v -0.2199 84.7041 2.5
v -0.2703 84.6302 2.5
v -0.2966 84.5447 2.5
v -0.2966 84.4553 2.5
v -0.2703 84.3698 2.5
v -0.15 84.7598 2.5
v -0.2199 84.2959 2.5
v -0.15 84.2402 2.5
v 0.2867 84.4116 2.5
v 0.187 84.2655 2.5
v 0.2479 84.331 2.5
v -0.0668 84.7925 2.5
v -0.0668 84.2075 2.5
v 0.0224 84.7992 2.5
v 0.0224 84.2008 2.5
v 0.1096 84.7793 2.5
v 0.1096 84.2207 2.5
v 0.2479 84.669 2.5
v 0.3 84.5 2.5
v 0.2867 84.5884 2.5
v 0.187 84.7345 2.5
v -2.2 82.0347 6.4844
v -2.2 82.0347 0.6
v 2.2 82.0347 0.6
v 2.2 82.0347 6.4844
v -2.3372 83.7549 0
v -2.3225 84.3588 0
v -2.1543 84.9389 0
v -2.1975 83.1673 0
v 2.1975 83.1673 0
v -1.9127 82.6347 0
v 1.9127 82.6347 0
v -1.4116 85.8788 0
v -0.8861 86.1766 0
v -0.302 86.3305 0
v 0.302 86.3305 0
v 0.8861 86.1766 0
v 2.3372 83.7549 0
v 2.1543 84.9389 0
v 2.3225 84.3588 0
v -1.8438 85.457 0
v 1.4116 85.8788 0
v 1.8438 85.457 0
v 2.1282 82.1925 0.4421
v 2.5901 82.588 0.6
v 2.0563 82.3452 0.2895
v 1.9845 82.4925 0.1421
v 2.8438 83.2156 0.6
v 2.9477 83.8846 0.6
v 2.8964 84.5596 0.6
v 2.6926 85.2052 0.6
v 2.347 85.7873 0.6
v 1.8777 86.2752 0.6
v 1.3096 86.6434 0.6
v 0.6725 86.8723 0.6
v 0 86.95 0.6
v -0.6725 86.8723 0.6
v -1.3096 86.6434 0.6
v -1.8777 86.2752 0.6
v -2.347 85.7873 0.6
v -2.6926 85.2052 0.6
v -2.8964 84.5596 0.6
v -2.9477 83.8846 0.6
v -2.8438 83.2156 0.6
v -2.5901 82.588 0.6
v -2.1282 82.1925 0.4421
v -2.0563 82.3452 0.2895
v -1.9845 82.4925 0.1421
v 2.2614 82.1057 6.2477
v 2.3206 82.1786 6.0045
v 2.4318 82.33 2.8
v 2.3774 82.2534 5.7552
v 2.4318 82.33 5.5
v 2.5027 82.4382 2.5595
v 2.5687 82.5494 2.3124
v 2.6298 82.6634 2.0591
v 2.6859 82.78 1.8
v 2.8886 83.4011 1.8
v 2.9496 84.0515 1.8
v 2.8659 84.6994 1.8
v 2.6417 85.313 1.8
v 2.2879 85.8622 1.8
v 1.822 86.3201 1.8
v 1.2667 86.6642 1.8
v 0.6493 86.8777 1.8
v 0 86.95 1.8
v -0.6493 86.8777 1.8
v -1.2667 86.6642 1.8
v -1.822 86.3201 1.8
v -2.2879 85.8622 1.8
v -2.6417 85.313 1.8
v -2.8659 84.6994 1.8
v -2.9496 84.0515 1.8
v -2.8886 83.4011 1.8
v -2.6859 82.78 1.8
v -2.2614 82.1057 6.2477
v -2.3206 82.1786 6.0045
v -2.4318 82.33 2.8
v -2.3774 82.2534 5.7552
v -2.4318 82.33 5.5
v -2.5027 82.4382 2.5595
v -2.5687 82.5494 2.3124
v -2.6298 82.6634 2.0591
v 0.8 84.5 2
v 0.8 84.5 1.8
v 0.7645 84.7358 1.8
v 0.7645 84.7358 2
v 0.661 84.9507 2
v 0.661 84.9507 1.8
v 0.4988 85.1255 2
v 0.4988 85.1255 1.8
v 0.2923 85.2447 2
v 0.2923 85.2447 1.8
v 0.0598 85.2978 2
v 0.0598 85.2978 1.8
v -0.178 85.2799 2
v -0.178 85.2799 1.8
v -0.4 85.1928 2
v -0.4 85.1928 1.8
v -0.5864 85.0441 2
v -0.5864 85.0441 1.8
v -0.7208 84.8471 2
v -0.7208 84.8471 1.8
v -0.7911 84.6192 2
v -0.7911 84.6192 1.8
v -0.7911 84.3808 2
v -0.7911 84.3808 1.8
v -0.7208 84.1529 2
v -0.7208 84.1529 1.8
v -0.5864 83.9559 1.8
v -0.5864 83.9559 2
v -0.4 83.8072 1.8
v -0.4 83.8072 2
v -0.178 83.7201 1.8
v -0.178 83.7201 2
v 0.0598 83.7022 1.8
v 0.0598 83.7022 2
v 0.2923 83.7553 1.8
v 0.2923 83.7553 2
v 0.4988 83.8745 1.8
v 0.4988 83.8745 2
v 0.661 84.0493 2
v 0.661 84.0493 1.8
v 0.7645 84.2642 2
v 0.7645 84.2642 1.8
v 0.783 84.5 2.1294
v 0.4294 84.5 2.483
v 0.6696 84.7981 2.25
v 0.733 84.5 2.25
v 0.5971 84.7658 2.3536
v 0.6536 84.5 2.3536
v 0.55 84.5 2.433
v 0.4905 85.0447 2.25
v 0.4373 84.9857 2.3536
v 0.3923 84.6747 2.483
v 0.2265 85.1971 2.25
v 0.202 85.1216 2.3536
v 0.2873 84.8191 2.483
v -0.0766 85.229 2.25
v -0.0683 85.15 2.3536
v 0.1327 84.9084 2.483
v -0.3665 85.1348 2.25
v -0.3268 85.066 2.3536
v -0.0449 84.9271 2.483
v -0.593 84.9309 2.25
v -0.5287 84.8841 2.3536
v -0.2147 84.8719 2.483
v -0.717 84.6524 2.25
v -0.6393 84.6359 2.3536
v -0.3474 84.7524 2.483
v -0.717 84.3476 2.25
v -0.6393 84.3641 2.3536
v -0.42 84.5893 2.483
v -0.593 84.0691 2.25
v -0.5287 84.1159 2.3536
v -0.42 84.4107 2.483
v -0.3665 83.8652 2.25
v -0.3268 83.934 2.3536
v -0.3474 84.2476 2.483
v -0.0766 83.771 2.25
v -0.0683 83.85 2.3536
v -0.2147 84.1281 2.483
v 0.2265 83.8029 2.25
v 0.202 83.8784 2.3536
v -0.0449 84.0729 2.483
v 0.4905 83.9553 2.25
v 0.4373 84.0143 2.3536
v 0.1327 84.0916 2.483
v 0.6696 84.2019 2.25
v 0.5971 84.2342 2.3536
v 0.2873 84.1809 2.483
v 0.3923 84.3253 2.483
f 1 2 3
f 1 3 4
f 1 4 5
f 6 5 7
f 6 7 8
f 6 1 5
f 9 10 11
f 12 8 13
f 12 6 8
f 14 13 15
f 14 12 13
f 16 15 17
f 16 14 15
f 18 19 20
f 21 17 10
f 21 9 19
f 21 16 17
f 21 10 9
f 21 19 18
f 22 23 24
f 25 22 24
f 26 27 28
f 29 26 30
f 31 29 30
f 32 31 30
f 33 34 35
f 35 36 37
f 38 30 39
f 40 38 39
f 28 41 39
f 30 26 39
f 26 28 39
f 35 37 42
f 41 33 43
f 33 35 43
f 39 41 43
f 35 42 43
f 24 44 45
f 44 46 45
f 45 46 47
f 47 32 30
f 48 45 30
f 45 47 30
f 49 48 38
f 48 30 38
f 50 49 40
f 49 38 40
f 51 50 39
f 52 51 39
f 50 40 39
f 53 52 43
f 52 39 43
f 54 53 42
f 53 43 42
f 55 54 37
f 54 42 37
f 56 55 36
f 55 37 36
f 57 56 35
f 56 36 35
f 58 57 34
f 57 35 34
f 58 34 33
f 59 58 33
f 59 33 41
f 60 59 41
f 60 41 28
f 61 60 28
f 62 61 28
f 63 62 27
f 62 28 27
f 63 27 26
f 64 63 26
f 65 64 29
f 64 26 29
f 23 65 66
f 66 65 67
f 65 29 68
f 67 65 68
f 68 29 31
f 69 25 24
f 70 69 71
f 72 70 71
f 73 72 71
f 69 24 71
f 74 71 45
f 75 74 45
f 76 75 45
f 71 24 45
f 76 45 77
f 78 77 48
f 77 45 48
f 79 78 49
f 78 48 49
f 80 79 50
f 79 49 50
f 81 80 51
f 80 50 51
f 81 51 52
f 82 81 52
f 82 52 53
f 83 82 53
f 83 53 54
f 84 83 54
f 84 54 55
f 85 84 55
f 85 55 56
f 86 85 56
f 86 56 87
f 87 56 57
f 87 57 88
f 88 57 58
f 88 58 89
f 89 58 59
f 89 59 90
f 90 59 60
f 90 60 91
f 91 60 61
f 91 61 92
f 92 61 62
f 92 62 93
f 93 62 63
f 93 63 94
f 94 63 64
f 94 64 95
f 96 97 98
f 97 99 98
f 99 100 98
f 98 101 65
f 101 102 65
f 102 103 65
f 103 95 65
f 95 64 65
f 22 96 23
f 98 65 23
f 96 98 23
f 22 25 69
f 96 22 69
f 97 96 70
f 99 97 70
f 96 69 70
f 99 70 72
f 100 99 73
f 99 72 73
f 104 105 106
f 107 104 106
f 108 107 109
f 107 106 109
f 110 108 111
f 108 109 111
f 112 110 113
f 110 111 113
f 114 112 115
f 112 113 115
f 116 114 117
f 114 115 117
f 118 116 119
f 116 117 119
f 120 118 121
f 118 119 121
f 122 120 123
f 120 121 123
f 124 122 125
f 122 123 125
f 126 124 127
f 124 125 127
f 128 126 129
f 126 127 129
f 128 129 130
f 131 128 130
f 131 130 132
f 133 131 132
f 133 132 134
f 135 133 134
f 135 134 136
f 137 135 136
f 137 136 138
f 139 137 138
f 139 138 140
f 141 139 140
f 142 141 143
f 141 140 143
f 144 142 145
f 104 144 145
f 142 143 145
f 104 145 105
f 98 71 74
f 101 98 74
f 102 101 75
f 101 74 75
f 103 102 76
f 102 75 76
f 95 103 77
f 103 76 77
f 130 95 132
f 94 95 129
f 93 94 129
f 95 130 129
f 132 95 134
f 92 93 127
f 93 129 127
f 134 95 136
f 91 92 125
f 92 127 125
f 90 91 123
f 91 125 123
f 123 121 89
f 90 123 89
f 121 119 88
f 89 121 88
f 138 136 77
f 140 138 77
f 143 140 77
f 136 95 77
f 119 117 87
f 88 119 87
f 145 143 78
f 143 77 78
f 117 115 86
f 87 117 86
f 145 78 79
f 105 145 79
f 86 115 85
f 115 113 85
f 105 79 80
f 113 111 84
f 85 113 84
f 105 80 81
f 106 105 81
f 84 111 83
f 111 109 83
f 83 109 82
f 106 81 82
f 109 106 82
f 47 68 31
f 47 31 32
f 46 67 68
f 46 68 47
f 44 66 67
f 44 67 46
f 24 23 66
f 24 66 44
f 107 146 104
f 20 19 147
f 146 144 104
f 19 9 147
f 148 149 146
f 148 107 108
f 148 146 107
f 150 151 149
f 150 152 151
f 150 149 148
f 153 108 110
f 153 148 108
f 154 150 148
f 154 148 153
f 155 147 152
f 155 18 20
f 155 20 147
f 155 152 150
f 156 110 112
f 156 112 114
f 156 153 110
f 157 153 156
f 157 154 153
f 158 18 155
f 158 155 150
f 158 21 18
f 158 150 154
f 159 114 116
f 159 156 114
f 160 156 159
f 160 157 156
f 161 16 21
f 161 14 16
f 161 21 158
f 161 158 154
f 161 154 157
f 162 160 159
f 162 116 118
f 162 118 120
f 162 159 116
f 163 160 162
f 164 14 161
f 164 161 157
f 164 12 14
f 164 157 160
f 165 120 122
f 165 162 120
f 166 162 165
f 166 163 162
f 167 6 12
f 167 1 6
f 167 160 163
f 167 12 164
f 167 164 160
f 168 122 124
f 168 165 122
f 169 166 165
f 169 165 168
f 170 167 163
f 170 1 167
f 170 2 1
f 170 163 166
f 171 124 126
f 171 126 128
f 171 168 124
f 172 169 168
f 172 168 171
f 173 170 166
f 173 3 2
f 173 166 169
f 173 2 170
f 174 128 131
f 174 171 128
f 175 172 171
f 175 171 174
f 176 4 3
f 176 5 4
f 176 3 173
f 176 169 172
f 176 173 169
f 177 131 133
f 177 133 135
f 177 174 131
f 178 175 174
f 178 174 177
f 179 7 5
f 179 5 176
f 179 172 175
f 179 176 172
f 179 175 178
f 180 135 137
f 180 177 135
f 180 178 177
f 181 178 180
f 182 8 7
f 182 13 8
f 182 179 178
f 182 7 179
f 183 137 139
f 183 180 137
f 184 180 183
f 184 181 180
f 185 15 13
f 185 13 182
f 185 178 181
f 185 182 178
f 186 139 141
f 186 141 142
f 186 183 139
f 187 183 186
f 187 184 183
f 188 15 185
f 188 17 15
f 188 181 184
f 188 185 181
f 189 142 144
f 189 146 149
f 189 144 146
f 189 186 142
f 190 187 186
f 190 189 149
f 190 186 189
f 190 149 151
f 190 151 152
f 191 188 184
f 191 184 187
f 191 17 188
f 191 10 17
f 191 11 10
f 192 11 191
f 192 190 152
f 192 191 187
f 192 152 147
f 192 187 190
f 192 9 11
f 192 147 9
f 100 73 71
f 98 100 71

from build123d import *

# Parameters (mm, degrees)
PAD003_DEPTH         = 6.5
POCKET004_DEPTH      = 2.951
POCKET004_DEPTH_BACK = 2.951
SKETCH013_R          = 0.8
PAD006_DEPTH         = 0.7
FILLET_R             = 0.5
CHAMFER004_SIZE      = 0.6


with BuildPart() as part:
    # Sketch004 → Pad003 (new body)
    with BuildSketch(Plane.XY):
        with BuildLine():
            ThreePointArc((2.2, -1.9653244007), (0, 2.95), (-2.2, -1.9653244007))
            Line((-2.2, -1.9653244007), (2.2, -1.9653244007))
        make_face()
    extrude(amount=PAD003_DEPTH)

    # Sketch014 → Pocket004 (cut, two sides)
    with BuildSketch(Plane.YZ) as pocket004_sk:
        Polygon((-1.97, 6.5), (-1.67, 5.5), (-1.67, 2.8), (-1.22, 1.8), (4, 1.8), (4, 6.5), align=None)
    extrude(amount=-POCKET004_DEPTH, mode=Mode.SUBTRACT)
    extrude(pocket004_sk.sketch, amount=POCKET004_DEPTH_BACK, mode=Mode.SUBTRACT)

    # Sketch013 (on Face7 of Pocket004) → Pad006 (join)
    with BuildSketch(Plane.XY.offset(1.8)):
        with Locations((0, 0.5)):
            Circle(SKETCH013_R)
    extrude(amount=PAD006_DEPTH)

    # Fillet
    fillet_edges = [part.edges().sort_by_distance(p)[0] for p in [
        (-0.8, 0.5, 2.5),
    ]]
    fillet(fillet_edges, radius=FILLET_R)

    # Chamfer004
    chamfer004_edges = [part.edges().sort_by_distance(p)[0] for p in [
        (0, 2.95, 0),
        (0, -1.965324, 0),
    ]]
    chamfer(chamfer004_edges, length=CHAMFER004_SIZE)


with BuildPart() as part_1:
    # Body033 placement: moved
    add(part.part.moved(Location((0, 84, 0))))


solid = part_1.part
